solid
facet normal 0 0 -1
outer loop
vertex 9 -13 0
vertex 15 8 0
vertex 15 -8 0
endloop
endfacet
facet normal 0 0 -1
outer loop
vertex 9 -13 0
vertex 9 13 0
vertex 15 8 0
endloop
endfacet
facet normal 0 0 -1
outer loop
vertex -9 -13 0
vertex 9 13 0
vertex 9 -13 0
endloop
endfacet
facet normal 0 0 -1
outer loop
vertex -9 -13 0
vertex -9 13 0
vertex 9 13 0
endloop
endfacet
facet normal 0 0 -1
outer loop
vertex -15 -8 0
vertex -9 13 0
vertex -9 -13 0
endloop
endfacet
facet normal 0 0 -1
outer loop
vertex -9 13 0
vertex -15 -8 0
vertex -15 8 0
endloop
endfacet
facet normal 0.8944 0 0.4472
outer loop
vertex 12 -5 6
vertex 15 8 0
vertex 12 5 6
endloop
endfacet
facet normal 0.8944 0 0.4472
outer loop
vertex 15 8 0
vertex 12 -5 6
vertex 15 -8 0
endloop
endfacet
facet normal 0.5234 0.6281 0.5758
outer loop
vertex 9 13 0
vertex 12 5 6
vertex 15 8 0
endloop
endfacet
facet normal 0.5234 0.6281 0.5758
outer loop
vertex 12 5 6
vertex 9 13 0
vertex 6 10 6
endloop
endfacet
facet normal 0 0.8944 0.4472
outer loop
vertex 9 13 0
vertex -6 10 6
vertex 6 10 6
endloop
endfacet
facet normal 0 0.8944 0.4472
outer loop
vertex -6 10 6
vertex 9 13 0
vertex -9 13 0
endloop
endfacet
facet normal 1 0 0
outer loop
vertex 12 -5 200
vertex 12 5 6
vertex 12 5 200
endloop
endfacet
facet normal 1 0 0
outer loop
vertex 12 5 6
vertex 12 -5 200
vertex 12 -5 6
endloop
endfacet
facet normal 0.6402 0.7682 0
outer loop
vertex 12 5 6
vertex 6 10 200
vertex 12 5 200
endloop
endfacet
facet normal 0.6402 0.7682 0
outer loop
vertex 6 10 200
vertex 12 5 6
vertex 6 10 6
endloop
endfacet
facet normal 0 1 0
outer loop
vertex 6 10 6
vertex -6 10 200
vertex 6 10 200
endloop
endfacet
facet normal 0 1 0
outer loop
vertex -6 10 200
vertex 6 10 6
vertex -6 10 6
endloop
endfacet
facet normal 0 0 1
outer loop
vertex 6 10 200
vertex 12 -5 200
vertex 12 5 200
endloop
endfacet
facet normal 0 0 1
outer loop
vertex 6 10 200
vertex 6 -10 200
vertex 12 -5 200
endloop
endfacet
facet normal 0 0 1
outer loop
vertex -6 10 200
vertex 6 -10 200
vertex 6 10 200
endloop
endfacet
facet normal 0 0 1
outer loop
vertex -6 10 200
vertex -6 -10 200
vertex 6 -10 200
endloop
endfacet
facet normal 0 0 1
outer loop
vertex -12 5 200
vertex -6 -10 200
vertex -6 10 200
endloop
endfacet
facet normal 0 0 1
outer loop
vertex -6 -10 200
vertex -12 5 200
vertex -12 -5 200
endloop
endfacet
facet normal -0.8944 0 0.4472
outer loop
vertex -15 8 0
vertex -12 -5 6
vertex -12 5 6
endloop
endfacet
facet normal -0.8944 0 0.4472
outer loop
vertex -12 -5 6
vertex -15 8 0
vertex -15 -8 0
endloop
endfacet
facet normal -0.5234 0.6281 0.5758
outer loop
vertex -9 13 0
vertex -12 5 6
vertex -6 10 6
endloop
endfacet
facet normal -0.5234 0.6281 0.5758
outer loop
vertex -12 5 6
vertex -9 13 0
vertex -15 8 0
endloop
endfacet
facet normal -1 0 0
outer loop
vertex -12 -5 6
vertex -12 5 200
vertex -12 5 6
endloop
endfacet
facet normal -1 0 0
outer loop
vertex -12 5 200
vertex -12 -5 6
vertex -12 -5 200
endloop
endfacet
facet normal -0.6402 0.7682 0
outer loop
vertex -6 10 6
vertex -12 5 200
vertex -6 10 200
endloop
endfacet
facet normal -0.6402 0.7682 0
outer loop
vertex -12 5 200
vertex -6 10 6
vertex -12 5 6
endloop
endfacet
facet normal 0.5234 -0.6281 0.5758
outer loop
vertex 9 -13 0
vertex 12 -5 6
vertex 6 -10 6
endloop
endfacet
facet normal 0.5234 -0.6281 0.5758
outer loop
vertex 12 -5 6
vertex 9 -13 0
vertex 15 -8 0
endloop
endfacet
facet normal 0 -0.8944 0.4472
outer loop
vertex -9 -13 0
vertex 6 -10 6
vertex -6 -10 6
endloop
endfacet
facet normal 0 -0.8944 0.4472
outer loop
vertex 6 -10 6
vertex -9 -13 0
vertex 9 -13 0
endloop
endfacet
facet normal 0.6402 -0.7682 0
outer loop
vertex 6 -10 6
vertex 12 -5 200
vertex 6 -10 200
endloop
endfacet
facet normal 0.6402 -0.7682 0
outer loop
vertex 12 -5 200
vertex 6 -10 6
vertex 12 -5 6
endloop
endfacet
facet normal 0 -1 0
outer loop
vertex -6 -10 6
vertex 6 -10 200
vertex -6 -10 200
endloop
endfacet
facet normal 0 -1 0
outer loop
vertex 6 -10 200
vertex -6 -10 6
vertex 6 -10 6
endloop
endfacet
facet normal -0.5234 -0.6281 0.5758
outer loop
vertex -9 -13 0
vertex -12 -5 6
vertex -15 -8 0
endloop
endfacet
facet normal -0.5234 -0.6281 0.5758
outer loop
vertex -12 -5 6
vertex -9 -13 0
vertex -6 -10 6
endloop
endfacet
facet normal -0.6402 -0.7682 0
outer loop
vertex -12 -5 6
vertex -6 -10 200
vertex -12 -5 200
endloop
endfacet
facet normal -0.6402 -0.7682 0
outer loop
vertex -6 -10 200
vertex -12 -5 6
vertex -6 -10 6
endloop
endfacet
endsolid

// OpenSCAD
xtf = 6;
xwf = 12;

ytf= 10;
ywf = 5;

xtb = 9;
xwb = 15;

ytb= 13;
ywb = 8;

zb = 6;
zm = 200;

handle(xtf,xwf,ytf,ywf,xtb,xwb,ytb,ywb,zb,zm);

module handle(xtf,xwf,ytf,ywf,xtb,xwb,ytb,ywb,zb,zm)
    union(){
        halfHandle(xtf,xwf,ytf,ywf,xtb,xwb,ytb,ywb,zb,zm);
        mirror(v=[0,1,0]) halfHandle(xtf,xwf,ytf,ywf,xtb,xwb,ytb,ywb,zb,zm);
    }

module halfHandle(xtf,xwf,ytf,ywf,xtb,xwb,ytb,ywb,zb,zm)
    union(){
        quarterHandle(xtf,xwf,ytf,ywf,xtb,xwb,ytb,ywb,zb,zm);
        mirror(v=[1,0,0]) quarterHandle(xtf,xwf,ytf,ywf,xtb,xwb,ytb,ywb,zb,zm);
    }

module quarterHandle(xtf,xwf,ytf,ywf,xtb,xwb,ytb,ywb,zb,zm) {
    polyhedron(
    points=[
        [0,0,0],[xwb,0,0],[xwb,ywb,0],[xtb,ytb,0],[0,ytb,0],      // 5 points 0,1,2,3,4 at base
        [0,0,zb],[xwf,0,zb],[xwf,ywf,zb],[xtf,ytf,zb],[0,ytf,zb], // points  5, 6, 7, 8, 9 for flat planes (bottom side)
        [0,0,zm],[xwf,0,zm],[xwf,ywf,zm],[xtf,ytf,zm],[0,ytf,zm]  // points 10,11,12,13,14 for flat planes (top side)
    ],
    faces=[
        [4,3,2,1,0],                    // bottom face
         [1,2,7,6],[2,3,8,7],[3,4,9,8],               // for tilted planes, of which 3 triangles can be seen from y direction
        [6,7,12,11],[7,8,13,12],[8,9,14,13],         // 3 flat(long) planes
        [9,5,10,14],[5,6,11,10],      // 2 inside triangles (to be hidden later), flat plain
        [0,1,6,5],[0,5,9,4],            // 2 inside planes (to be hidden later), bottom side
        // [10,11,12],[10,12,13],[10,13,14],               // top face
        [10,11,12,13,14],               // top face

     ]
 );
}
